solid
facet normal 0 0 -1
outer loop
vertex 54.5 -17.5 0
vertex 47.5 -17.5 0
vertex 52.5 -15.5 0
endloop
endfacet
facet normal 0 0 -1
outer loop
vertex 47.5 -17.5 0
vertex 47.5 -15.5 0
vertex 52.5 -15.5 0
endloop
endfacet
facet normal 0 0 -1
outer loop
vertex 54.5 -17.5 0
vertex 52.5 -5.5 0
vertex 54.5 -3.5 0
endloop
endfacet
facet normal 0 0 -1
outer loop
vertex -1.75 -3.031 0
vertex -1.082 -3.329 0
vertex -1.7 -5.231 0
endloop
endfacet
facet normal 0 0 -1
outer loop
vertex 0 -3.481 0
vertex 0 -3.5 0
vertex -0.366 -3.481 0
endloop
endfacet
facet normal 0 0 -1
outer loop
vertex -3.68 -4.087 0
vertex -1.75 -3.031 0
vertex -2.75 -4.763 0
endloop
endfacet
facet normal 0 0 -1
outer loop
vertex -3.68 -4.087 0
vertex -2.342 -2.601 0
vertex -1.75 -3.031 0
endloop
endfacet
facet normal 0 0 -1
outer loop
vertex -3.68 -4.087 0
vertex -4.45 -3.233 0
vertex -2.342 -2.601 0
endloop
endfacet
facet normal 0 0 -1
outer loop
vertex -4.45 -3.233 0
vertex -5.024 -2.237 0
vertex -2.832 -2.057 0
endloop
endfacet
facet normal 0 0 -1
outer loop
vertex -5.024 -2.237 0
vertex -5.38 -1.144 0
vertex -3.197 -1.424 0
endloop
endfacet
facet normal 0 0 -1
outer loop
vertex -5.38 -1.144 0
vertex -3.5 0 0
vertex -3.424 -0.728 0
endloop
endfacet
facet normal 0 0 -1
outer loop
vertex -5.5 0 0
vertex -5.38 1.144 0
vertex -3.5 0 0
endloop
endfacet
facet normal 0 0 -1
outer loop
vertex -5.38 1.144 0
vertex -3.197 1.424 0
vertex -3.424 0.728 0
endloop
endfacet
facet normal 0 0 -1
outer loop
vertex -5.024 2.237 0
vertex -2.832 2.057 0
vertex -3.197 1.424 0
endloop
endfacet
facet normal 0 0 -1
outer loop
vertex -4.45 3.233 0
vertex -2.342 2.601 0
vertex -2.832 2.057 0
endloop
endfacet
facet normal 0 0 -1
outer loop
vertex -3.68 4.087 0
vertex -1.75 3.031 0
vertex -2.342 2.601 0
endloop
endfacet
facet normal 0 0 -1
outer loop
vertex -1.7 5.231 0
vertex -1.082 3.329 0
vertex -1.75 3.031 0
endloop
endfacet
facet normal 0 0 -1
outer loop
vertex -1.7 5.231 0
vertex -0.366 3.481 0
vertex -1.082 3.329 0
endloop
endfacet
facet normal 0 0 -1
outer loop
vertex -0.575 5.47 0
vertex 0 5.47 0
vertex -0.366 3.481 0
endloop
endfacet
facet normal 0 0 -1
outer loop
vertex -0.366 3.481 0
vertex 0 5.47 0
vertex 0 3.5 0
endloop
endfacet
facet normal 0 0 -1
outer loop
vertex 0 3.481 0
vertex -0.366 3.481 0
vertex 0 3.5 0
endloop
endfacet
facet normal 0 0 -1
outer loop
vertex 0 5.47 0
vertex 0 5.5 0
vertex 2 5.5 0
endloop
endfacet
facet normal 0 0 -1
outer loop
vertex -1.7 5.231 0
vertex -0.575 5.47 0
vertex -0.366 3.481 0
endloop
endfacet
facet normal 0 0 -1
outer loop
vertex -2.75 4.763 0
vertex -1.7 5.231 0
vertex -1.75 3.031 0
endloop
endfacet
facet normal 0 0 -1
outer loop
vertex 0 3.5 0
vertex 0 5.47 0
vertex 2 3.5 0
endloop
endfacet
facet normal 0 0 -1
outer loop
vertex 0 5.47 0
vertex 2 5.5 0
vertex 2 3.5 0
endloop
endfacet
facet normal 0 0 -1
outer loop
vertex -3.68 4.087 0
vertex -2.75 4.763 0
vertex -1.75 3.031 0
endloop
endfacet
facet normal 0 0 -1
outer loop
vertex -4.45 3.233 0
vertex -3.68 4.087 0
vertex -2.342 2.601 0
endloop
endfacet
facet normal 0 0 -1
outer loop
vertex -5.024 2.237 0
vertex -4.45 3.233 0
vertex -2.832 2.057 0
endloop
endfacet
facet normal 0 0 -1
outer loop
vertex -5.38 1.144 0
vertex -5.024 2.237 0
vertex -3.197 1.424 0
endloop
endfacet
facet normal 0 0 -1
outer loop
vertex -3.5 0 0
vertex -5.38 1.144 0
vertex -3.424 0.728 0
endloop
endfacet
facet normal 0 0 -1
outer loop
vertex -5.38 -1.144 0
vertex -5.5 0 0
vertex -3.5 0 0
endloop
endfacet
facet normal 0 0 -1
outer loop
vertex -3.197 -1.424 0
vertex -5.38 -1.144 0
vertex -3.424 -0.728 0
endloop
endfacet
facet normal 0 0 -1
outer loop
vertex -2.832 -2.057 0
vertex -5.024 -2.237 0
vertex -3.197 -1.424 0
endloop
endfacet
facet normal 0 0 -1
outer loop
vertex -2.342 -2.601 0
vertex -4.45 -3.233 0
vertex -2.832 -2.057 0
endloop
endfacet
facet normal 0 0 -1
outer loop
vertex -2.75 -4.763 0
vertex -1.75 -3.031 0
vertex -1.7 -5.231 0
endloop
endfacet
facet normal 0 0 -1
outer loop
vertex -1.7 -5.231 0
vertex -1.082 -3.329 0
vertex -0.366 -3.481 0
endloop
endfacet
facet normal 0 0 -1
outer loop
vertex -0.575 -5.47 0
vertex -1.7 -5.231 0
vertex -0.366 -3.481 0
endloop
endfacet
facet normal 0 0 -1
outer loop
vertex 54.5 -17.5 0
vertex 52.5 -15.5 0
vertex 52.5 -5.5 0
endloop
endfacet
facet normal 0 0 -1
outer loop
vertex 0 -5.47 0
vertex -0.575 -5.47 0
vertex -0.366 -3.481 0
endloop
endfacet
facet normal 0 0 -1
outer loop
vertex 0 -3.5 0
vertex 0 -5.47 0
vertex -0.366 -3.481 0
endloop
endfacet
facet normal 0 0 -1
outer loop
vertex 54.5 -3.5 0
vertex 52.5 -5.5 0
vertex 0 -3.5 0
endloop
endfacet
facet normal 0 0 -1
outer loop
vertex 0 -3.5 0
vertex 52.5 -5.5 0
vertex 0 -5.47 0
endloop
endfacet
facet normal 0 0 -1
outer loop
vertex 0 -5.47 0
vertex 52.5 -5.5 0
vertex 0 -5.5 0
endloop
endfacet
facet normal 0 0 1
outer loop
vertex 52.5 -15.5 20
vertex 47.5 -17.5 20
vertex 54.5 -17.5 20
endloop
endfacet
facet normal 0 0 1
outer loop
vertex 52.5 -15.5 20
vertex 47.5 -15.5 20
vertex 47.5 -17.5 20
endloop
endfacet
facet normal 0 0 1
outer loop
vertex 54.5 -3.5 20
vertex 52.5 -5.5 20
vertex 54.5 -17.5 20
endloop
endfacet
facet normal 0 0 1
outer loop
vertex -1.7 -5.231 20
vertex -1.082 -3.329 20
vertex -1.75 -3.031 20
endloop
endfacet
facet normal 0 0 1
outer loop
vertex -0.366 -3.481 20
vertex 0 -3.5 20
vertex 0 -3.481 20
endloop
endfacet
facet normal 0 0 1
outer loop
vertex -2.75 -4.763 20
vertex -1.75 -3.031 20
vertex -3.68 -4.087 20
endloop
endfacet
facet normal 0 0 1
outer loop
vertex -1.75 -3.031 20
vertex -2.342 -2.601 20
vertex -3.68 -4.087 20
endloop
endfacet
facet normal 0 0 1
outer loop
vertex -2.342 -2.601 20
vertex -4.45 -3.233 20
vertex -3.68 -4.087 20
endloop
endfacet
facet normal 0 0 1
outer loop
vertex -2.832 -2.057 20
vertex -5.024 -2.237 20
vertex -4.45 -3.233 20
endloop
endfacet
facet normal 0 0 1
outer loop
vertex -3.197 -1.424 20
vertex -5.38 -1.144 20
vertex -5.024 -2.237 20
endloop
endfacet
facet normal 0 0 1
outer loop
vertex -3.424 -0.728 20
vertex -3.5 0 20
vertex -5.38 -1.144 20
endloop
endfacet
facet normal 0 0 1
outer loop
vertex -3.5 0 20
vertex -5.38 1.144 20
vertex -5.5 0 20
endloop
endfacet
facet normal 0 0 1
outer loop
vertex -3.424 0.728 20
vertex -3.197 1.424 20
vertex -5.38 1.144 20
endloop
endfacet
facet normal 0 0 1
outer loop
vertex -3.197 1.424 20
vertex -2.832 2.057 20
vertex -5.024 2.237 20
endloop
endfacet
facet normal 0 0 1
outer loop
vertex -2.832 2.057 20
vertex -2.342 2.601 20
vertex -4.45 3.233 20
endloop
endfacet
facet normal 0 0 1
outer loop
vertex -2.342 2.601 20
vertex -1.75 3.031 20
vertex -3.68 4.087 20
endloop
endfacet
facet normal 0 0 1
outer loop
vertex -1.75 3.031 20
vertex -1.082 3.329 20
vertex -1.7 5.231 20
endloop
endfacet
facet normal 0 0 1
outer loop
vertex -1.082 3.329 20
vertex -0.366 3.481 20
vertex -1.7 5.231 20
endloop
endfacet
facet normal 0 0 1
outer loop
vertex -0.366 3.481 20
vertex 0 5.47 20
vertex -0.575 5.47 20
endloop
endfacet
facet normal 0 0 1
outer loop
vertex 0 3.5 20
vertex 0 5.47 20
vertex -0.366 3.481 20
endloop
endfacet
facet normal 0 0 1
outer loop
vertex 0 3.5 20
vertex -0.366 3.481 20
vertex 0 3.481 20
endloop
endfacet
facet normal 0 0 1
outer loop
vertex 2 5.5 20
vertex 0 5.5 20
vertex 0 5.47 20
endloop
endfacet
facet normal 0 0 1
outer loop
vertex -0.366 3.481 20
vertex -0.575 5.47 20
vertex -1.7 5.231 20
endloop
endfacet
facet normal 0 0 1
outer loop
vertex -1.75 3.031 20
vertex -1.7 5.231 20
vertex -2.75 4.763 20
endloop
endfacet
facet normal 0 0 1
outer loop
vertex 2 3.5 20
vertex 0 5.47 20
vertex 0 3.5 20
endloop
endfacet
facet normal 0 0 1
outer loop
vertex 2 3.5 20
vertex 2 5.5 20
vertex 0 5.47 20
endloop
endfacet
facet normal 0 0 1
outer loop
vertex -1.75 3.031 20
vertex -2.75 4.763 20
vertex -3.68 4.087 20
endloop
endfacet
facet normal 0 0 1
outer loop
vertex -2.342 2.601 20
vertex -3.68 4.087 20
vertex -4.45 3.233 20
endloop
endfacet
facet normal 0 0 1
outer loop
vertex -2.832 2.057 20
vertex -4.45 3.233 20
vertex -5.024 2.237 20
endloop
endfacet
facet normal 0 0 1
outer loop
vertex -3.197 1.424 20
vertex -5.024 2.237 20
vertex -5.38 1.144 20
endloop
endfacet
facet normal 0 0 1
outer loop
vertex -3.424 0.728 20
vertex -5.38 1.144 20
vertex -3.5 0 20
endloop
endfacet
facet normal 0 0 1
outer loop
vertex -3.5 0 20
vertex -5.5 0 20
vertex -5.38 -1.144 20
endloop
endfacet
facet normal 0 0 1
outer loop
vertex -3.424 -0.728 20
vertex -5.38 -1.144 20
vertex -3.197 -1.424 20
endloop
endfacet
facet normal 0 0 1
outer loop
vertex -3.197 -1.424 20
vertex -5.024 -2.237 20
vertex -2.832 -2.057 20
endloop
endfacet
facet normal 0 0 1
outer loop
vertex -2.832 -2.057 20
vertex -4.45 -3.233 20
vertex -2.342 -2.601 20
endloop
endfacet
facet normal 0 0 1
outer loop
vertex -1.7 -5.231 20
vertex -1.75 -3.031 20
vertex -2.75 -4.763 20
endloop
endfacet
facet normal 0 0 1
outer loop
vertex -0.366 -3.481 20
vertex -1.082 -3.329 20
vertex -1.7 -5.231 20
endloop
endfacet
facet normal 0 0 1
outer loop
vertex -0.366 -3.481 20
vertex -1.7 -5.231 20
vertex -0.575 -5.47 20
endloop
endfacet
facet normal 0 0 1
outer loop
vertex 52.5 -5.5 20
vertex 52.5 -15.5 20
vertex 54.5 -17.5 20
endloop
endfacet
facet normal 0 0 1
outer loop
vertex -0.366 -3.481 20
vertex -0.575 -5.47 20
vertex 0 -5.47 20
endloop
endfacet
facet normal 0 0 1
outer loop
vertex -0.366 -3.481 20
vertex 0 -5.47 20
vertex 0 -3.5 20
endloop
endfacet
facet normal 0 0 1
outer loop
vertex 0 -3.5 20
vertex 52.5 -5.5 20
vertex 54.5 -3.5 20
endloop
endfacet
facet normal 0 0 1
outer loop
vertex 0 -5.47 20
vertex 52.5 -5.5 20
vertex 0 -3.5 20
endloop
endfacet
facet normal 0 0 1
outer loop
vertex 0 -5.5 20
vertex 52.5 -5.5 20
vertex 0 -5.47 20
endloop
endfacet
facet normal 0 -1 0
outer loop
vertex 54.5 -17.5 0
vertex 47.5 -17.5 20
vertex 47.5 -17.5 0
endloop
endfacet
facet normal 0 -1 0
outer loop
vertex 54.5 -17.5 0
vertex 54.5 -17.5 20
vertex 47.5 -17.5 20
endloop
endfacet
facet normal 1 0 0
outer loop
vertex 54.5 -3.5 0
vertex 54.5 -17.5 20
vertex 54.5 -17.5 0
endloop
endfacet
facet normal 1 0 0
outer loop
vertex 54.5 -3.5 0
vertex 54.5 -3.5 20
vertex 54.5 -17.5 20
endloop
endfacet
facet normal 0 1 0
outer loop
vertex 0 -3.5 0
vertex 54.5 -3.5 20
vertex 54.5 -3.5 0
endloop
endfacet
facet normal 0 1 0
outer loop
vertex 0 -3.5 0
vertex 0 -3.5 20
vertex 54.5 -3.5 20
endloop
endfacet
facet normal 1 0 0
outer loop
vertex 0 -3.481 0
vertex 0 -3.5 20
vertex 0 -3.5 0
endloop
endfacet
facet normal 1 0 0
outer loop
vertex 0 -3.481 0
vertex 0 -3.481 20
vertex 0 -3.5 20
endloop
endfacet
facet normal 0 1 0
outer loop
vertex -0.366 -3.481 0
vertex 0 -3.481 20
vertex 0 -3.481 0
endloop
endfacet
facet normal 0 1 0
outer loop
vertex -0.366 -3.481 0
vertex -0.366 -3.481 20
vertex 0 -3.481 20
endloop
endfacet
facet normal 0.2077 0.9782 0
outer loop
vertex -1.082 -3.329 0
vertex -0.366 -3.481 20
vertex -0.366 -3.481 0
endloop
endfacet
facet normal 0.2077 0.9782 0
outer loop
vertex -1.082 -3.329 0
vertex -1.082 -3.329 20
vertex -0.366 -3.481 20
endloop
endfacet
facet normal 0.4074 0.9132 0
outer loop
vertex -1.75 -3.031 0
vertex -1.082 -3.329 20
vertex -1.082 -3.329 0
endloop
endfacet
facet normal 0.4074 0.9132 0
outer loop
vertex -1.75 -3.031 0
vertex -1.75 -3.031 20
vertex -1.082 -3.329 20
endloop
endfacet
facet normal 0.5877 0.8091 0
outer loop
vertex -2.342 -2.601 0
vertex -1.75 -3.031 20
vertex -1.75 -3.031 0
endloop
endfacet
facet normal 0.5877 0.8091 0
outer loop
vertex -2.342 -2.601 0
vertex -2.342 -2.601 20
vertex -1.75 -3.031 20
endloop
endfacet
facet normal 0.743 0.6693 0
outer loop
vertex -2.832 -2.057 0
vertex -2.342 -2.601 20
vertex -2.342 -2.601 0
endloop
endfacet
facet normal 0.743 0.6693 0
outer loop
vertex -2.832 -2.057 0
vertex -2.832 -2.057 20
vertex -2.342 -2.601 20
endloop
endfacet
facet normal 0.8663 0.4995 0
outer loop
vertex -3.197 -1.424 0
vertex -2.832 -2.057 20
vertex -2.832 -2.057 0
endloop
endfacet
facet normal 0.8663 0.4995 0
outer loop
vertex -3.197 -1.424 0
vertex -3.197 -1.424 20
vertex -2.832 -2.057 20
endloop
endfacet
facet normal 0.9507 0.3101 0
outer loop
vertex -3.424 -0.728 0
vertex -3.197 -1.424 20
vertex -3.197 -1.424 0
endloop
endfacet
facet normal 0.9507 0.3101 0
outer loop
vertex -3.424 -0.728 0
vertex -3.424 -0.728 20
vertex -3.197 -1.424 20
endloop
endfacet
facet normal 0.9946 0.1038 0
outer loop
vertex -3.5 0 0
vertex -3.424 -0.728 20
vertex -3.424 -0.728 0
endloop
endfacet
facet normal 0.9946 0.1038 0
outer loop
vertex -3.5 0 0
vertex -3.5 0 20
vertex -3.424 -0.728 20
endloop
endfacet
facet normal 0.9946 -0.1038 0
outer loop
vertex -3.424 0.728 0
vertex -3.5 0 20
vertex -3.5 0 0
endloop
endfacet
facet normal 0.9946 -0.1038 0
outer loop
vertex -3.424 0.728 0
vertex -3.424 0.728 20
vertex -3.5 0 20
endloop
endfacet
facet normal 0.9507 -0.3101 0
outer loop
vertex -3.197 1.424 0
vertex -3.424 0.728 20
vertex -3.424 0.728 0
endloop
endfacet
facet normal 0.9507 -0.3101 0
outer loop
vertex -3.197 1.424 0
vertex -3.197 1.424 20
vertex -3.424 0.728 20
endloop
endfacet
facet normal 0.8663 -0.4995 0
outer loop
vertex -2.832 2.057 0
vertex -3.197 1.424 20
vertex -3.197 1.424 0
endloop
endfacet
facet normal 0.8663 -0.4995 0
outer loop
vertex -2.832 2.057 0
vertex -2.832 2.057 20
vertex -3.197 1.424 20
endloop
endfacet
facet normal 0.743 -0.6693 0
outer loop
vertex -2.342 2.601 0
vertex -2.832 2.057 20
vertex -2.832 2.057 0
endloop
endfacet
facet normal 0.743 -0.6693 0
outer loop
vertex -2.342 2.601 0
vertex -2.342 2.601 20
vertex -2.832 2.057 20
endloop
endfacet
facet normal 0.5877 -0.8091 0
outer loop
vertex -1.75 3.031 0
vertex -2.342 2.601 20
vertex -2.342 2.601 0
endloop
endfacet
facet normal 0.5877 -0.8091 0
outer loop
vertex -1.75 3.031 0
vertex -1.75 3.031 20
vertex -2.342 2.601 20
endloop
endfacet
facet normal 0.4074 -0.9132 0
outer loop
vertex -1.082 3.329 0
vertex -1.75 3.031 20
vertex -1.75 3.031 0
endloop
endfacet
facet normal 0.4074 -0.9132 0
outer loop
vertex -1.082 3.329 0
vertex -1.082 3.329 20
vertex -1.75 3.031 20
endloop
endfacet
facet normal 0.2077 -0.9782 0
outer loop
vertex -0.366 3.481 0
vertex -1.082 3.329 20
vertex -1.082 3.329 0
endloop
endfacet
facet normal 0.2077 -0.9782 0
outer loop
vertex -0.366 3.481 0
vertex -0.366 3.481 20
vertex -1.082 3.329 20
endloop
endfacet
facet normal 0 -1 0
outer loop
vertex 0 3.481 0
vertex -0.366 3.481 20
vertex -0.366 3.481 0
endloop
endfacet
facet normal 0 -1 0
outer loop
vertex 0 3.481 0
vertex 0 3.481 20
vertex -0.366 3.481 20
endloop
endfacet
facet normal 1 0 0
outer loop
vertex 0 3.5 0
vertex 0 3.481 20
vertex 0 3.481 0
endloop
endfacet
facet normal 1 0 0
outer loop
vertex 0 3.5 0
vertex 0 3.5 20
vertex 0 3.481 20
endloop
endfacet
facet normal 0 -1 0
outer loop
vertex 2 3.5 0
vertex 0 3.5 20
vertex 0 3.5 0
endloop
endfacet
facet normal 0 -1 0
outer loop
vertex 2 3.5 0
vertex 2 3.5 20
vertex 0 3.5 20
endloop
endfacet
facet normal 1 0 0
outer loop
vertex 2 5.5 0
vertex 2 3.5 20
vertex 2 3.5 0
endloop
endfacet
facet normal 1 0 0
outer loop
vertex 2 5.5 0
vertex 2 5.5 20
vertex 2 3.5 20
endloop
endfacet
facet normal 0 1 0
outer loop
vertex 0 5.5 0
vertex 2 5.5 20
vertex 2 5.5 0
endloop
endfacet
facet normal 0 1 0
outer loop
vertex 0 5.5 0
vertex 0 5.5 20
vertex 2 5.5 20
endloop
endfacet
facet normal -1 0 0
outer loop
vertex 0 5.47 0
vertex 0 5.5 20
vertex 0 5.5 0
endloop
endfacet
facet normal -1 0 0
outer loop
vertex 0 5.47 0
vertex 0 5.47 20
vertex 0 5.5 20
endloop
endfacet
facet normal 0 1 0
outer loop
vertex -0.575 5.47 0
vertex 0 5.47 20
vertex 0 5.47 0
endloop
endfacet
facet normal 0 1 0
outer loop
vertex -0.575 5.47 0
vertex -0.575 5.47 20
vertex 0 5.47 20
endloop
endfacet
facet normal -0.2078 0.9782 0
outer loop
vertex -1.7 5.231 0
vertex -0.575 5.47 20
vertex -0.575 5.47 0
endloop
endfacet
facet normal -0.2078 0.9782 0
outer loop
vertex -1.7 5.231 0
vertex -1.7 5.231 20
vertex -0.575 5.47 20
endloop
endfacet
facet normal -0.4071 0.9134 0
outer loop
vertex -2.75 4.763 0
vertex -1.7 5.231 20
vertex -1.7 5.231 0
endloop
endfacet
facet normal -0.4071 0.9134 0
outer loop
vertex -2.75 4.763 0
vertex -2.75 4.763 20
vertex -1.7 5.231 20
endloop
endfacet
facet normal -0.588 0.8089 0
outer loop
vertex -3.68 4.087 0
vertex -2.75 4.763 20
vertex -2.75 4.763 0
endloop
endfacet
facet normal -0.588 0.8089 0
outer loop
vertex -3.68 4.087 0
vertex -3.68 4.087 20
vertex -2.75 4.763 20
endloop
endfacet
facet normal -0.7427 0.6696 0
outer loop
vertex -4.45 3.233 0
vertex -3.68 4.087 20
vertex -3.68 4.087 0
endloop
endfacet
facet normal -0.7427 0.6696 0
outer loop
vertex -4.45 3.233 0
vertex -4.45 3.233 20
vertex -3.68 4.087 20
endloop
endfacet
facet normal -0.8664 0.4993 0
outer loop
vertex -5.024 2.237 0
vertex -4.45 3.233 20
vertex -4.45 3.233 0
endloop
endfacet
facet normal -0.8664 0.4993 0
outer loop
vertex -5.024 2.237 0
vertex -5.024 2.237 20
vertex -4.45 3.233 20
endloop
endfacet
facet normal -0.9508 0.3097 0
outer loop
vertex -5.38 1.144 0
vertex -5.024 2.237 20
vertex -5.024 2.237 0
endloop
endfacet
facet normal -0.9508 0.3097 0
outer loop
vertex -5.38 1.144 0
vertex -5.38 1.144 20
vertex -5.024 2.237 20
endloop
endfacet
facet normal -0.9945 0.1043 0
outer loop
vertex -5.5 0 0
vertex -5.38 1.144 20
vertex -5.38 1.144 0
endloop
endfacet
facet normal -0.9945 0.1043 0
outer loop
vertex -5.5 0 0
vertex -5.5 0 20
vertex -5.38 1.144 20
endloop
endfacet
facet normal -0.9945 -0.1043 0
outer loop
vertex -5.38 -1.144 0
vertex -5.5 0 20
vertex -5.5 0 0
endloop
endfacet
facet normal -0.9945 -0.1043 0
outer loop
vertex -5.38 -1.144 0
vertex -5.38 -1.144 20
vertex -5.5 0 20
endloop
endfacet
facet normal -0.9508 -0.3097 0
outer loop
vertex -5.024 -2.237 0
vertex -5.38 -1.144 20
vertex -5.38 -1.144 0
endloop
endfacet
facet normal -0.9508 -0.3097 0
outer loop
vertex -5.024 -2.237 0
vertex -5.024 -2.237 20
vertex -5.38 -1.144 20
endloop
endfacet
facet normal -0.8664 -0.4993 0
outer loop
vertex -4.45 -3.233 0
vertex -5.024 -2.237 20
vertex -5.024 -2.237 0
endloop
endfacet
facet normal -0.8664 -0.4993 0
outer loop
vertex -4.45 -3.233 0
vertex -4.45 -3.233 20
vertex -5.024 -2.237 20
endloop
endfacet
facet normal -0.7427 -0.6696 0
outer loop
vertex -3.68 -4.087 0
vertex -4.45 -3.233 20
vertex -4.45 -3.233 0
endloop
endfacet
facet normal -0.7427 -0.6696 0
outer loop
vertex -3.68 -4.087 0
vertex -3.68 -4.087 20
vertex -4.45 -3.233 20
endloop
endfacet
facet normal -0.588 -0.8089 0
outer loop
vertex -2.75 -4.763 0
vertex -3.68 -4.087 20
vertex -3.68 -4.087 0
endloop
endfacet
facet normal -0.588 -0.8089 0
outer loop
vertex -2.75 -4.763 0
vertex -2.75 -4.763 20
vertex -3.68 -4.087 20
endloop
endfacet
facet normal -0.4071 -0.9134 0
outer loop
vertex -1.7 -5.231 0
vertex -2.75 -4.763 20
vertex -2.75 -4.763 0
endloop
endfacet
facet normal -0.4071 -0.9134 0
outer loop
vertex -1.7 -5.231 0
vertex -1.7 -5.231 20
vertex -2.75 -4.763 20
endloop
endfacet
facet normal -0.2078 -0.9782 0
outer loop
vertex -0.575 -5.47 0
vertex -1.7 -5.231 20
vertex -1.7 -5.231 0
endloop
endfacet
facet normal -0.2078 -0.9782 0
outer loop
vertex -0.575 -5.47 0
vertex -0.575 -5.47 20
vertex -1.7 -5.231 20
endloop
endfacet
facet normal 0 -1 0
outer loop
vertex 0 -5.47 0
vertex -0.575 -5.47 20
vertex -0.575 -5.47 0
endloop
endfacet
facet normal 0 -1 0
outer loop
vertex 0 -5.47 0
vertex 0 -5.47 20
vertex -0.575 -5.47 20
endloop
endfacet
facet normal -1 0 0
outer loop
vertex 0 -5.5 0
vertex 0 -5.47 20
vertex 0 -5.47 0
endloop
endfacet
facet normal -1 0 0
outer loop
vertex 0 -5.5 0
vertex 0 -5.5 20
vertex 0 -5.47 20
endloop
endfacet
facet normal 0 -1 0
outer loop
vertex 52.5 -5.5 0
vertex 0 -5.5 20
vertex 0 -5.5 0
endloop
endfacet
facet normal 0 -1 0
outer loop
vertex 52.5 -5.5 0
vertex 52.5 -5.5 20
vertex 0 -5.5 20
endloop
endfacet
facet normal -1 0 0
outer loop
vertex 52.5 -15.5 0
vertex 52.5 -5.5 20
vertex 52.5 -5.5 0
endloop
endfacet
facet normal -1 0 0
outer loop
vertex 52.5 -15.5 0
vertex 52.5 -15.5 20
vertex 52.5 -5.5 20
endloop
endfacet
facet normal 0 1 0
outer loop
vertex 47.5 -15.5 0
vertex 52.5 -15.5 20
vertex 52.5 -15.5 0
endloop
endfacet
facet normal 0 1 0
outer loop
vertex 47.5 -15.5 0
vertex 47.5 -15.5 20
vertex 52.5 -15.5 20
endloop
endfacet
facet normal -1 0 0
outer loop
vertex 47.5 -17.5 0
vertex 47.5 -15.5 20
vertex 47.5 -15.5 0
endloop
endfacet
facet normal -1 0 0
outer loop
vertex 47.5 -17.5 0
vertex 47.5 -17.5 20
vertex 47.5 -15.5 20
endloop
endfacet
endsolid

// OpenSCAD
innerD = 7;         // Diameter of the top hook
thick = 2;            // material thickness
lengthOverall = 60;  // Total length of the hook
supportDepth = 10;  // How far the bottom extends
supportHeight = 5; // How tall the bottom comes up
width = 20;         //  Width of the hook across

outerD = innerD + thick*2;

linear_extrude(height=width) {
    union() {
        union() {
            union() {
                union() {
                    difference() {
                        difference() {
                            circle(d=outerD, $fn=30);
                            circle(d=innerD, $fn=30);
                        }
                        translate([0, -outerD/2, 0]) square([outerD, outerD], false);
                    }
                    translate([0, innerD/2, 0]) square([thick, thick], false);
                }
                translate([0, -outerD/2, 0]) square([lengthOverall-outerD/2, thick], false);
            }
            translate([lengthOverall-outerD/2-thick, -outerD/2-supportDepth, 0]) square([thick, supportDepth]);
        }
        translate([lengthOverall-outerD/2-supportHeight-thick, -outerD/2-supportDepth-thick]) square([supportHeight+thick, thick]);
    }
}
